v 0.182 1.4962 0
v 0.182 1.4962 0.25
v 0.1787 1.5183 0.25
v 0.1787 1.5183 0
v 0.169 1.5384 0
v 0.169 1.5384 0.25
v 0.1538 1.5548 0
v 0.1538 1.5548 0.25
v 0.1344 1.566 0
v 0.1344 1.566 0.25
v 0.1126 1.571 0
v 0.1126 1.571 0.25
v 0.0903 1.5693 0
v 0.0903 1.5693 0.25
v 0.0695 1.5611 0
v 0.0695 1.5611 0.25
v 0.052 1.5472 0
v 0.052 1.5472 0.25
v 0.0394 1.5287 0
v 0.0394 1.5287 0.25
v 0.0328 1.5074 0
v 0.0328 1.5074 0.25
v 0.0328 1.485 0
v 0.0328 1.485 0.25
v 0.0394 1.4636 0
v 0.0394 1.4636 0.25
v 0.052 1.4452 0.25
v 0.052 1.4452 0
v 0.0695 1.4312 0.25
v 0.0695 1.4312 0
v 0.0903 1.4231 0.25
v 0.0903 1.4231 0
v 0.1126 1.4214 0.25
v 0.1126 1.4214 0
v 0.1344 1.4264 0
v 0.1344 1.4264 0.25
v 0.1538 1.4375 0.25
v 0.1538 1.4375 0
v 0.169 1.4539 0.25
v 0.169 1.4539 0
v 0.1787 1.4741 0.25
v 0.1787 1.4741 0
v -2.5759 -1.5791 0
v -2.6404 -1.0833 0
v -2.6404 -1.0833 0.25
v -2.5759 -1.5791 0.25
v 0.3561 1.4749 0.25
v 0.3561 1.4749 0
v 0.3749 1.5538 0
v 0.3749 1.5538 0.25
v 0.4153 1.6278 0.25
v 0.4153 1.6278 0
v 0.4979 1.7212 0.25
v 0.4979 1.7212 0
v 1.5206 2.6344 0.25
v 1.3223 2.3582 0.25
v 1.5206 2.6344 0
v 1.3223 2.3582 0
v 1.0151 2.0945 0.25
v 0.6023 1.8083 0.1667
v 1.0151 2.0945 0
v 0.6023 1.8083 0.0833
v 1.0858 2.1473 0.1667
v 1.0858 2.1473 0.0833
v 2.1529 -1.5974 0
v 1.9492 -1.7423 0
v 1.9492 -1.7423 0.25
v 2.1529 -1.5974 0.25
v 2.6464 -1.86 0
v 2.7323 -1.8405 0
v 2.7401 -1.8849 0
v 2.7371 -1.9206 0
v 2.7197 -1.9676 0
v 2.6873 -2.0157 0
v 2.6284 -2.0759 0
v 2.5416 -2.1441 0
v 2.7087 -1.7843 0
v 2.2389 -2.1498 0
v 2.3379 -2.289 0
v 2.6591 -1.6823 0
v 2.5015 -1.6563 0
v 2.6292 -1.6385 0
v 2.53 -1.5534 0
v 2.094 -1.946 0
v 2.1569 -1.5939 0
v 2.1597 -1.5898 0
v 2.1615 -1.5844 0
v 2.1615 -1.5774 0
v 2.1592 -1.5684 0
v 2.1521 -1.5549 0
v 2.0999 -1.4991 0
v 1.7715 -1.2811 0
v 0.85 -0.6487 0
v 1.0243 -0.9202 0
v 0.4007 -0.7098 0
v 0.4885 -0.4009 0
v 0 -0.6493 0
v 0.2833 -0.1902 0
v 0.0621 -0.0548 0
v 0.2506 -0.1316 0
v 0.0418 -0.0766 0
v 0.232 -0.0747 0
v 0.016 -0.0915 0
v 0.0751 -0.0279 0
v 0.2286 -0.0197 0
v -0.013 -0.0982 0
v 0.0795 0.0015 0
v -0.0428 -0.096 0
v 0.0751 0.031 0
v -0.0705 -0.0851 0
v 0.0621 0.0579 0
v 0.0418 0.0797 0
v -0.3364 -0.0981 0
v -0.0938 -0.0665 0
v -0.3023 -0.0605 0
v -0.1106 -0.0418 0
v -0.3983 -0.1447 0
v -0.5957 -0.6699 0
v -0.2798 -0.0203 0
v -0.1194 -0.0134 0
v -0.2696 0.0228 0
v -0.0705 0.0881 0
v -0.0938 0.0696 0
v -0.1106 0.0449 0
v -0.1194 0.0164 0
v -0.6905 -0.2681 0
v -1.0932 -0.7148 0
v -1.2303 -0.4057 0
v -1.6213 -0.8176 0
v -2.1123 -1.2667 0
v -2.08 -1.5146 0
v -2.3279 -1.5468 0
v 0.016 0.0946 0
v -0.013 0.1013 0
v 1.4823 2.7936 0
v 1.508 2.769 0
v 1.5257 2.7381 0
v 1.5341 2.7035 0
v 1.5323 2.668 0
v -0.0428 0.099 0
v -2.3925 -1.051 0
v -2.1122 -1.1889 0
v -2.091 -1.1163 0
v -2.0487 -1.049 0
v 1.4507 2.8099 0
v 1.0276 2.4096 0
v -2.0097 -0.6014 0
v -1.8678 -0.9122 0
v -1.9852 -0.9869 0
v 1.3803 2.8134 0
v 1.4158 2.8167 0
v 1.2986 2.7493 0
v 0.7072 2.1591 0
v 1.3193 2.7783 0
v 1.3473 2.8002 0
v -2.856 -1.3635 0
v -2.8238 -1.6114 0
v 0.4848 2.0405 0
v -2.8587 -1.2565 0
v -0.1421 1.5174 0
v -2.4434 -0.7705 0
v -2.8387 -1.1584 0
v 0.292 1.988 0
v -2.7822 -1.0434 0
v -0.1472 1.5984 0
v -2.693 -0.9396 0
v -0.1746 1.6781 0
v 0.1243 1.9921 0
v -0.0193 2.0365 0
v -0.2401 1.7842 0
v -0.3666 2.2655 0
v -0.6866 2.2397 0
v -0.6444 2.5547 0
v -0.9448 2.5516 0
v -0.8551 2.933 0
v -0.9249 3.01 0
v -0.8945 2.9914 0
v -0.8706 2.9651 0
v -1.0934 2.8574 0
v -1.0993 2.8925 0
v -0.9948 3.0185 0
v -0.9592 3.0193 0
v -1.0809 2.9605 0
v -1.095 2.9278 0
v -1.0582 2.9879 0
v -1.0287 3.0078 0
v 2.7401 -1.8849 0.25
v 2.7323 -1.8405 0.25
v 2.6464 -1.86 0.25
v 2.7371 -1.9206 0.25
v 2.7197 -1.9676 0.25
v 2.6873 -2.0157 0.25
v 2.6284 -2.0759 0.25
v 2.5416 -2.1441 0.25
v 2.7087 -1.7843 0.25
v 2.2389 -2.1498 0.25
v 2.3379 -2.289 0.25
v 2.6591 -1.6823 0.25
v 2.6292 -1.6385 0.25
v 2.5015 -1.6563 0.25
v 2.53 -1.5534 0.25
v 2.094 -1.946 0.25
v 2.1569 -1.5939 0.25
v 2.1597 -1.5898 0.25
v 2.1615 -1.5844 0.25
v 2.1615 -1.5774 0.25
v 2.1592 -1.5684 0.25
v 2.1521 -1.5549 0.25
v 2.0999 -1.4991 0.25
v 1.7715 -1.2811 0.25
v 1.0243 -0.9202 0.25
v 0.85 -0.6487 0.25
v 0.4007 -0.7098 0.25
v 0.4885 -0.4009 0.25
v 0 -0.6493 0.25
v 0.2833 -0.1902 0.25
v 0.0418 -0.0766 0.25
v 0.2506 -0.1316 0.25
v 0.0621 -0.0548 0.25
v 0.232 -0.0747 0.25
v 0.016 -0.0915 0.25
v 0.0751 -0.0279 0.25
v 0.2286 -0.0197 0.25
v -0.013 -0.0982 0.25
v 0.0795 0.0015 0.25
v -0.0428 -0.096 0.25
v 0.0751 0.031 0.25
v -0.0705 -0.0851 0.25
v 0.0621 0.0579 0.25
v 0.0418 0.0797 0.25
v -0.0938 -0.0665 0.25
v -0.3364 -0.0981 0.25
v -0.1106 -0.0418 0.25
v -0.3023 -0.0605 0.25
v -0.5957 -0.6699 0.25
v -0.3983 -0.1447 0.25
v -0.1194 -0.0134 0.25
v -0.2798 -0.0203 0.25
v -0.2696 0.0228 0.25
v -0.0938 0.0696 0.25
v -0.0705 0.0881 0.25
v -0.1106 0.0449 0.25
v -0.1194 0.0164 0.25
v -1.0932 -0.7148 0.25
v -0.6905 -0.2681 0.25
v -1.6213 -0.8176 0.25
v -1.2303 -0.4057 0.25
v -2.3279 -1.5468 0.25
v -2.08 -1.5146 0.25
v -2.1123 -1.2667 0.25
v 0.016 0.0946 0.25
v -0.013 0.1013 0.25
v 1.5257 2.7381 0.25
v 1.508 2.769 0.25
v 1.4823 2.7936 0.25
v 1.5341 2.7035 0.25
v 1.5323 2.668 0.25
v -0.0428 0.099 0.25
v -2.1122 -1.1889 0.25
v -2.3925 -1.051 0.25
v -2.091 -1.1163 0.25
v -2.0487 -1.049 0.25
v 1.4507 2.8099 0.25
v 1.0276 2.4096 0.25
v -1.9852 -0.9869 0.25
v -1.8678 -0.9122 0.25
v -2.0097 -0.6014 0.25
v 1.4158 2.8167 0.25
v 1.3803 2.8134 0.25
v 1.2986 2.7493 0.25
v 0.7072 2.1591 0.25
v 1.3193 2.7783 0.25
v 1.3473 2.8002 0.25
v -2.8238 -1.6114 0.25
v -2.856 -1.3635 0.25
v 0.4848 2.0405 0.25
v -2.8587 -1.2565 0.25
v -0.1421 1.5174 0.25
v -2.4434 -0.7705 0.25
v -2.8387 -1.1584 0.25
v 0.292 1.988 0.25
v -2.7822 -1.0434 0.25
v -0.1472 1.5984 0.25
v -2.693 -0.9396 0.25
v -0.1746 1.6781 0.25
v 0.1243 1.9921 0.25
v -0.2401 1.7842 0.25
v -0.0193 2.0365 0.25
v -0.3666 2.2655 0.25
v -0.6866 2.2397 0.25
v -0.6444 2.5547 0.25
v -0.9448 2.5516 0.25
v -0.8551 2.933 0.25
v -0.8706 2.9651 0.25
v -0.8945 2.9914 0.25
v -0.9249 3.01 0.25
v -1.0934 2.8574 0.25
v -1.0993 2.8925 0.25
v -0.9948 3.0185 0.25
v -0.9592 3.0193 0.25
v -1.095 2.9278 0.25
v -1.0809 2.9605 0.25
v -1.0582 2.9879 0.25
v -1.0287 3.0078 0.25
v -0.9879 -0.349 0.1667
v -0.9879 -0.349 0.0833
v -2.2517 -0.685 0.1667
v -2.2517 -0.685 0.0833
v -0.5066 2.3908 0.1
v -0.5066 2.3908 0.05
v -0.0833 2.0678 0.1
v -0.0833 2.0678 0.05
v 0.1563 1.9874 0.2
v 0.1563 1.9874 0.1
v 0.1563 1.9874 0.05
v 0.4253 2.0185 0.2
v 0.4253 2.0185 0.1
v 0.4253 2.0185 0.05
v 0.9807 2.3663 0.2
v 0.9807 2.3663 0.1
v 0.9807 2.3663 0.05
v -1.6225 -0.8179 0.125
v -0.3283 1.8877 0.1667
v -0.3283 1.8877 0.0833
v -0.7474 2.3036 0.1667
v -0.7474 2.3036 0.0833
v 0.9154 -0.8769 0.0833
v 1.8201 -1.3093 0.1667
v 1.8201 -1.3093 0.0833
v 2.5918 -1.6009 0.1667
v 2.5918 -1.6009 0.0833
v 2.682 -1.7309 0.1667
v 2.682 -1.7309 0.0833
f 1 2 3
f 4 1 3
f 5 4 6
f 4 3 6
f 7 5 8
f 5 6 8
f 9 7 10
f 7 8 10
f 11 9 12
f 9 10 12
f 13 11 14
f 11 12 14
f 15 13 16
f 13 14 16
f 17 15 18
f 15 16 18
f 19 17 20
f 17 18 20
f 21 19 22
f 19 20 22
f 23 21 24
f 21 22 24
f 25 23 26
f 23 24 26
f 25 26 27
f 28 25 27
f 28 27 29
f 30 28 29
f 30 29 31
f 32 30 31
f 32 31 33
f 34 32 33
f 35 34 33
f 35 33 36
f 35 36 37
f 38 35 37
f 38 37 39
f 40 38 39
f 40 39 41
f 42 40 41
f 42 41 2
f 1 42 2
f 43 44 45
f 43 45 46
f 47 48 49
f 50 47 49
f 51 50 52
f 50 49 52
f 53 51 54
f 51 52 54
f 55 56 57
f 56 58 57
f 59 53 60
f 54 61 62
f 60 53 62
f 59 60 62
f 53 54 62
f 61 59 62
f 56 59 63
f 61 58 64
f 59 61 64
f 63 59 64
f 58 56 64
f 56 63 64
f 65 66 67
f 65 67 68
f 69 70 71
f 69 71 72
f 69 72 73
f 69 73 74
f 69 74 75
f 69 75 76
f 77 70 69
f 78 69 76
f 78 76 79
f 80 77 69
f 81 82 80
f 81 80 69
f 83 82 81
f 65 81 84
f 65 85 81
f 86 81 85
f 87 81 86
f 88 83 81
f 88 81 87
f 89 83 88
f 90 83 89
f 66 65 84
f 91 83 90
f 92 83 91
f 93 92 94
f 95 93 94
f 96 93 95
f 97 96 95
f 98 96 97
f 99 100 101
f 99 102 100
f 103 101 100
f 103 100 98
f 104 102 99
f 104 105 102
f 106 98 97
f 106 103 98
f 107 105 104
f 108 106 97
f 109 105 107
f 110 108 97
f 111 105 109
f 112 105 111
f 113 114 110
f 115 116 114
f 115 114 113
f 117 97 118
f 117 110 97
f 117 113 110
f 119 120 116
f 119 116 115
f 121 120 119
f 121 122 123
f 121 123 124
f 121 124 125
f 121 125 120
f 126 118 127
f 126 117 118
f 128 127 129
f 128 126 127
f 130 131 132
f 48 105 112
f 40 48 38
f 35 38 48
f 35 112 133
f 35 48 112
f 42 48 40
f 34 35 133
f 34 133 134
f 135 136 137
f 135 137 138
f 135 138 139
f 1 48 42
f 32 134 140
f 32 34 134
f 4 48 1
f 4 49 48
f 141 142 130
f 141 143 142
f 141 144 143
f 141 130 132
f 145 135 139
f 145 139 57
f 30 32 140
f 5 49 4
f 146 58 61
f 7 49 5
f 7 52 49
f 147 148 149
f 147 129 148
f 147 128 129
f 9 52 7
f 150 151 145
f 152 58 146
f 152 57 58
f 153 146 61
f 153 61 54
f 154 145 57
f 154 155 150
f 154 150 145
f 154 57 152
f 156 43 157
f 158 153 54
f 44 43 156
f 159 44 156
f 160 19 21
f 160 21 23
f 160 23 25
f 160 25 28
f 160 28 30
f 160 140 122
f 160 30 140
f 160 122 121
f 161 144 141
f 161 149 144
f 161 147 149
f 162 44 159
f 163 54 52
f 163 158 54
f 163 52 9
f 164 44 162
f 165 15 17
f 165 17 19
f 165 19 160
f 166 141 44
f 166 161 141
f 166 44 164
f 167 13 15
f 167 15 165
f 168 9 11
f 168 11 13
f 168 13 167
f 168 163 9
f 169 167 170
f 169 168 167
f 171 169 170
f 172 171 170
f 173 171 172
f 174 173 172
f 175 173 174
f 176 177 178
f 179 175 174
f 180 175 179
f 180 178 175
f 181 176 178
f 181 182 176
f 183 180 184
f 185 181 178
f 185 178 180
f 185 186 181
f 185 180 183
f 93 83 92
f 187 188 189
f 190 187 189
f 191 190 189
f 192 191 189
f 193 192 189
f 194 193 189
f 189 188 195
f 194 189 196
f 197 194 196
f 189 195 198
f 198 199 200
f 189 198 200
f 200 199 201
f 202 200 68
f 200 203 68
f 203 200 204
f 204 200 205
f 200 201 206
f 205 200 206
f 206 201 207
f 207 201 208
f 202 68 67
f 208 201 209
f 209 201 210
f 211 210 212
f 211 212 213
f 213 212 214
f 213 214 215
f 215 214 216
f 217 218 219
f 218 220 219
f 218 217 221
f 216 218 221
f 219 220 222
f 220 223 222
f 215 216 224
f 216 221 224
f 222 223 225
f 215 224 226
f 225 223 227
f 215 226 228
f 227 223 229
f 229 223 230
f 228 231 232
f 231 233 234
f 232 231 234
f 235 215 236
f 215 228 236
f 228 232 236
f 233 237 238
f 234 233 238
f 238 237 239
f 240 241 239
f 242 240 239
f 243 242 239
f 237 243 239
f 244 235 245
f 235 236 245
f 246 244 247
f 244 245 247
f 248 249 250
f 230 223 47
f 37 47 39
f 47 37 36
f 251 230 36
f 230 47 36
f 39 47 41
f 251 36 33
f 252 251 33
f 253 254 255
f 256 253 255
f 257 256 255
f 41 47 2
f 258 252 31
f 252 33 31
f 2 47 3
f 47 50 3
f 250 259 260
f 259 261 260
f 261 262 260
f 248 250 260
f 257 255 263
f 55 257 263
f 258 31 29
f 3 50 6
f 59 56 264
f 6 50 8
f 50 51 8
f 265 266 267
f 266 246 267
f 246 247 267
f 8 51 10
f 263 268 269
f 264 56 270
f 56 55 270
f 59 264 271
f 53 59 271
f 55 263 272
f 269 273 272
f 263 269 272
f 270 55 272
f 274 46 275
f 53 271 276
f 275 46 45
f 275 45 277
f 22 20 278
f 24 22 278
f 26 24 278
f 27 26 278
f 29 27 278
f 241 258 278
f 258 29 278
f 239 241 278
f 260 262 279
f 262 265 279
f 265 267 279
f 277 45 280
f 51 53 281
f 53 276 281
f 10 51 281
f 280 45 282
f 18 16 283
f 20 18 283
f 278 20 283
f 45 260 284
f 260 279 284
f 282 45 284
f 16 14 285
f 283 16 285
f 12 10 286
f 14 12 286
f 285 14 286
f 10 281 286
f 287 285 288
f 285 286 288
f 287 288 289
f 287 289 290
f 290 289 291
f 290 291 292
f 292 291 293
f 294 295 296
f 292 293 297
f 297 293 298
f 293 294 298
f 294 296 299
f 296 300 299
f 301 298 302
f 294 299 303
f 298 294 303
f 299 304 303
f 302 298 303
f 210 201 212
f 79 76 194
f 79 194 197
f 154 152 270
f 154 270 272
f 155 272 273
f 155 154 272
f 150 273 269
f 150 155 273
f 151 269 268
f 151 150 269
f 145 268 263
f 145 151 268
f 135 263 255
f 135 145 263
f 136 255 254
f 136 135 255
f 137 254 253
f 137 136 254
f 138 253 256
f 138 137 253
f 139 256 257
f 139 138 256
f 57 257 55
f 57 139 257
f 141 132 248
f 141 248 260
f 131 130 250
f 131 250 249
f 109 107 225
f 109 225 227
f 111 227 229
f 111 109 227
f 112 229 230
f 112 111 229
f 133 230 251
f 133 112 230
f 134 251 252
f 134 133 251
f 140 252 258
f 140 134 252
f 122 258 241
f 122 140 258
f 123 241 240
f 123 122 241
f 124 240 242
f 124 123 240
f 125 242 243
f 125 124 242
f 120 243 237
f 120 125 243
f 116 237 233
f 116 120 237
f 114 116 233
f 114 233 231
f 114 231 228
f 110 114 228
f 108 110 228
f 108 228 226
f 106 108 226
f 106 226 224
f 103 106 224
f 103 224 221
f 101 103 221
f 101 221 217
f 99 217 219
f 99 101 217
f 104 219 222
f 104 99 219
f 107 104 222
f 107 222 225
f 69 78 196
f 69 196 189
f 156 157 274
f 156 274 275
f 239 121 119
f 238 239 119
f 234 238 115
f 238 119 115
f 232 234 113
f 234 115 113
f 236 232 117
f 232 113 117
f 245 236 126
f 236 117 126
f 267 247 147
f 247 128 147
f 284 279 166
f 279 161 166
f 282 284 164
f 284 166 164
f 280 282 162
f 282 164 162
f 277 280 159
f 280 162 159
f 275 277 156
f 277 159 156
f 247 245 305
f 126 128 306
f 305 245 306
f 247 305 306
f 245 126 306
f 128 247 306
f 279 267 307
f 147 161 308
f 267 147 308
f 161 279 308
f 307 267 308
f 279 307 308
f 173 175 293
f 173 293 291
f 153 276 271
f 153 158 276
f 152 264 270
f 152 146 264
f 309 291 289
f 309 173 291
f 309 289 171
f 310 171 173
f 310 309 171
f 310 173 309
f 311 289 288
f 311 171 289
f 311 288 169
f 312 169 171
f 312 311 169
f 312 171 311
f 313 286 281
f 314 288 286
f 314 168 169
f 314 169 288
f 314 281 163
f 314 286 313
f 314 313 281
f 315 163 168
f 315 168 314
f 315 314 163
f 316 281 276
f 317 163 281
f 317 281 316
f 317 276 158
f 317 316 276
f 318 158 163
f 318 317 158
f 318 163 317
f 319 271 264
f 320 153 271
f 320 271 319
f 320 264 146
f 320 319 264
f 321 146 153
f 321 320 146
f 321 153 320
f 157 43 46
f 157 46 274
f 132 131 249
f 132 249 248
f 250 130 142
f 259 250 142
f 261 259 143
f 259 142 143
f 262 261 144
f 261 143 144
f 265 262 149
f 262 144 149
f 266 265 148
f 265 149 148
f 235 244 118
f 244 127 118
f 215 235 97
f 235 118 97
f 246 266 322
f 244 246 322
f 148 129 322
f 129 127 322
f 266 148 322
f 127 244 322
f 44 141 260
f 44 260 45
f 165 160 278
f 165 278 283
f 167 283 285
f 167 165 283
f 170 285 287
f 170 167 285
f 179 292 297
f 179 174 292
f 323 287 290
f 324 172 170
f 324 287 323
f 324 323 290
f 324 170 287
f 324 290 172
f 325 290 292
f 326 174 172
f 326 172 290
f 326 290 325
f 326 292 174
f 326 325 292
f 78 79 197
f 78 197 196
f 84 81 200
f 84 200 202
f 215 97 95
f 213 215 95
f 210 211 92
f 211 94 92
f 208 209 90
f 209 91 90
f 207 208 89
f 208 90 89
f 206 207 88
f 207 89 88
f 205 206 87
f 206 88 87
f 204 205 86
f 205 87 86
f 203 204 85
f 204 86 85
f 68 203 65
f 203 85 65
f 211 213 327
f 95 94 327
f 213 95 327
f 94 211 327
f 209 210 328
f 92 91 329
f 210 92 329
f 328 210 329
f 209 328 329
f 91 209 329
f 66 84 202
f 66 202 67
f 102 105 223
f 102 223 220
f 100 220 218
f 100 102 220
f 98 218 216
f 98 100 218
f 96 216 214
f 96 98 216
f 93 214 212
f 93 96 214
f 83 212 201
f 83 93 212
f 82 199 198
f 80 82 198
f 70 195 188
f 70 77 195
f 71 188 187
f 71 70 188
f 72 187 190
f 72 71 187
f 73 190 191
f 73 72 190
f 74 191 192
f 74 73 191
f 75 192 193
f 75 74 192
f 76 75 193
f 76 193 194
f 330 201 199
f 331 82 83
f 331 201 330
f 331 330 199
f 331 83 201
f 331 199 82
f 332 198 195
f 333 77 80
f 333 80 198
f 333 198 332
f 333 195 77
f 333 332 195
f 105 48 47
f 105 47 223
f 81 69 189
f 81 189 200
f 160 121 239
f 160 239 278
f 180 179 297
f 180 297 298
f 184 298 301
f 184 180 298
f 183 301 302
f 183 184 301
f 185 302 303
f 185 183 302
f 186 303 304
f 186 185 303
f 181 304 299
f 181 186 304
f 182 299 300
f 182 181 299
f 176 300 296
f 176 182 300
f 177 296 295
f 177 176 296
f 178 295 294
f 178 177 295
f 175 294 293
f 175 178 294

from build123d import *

# Parameters (mm, degrees)
CROQUIS2_R              = 0.1
SALIENTE_EXTRUIR1_DEPTH = 0.25
CORTAR_EXTRUIR1_REACH   = 2.25
CROQUIS3_R              = 0.075


with BuildPart() as part:
    # Croquis2 → Saliente-Extruir1 (new body)
    with BuildSketch(Plane.XY):
        with BuildLine():
            Line((-0.269598267, 0.022789063), (-0.142105821, 1.517361134))
            add(Edge.make_bspline(
                [(-0.142105821, 1.517361134), (-0.109838872, 1.89562104), (-0.885940975, 2.203998579), (-1.093422206, 2.857380392)],
                knots=[0, 0, 0, 0, 1, 1, 1, 1], degree=3))
            ThreePointArc((-1.093422206, 2.857380392), (-1.012116817, 3.014349923), (-0.855147286, 2.933044534))
            add(Edge.make_bspline(
                [(-0.855147286, 2.933044534), (-0.802855117, 2.791522862), (-0.626812715, 2.478271421), (-0.035560561, 1.991764327), (0.301694252, 1.837503211), (1.044165071, 2.405999525), (1.189353221, 2.580037978), (1.298605199, 2.749321595)],
                knots=[0, 0, 0, 0, 0.244258263, 0.330799973, 0.806015197, 0.87887539, 1, 1, 1, 1], degree=3))
            ThreePointArc((1.298605199, 2.749321595), (1.467077873, 2.802865578), (1.520621856, 2.634392904))
            add(Edge.make_bspline(
                [(0.35608487, 1.474863652), (0.388351819, 1.853123558), (1.20547196, 2.025593431), (1.520621856, 2.634392904)],
                knots=[0, 0, 0, 0, 1, 1, 1, 1], degree=3))
            Line((0.35608487, 1.474863652), (0.228592423, -0.01970842))
            add(Edge.make_bspline(
                [(0.228592423, -0.01970842), (0.186017725, -0.518804304), (2.575198102, -1.415220642), (2.703175685, -1.813334927), (2.829784292, -1.939232669), (2.541637207, -2.144125176)],
                knots=[0, 0, 0, 0, 0.598179598, 0.698179598, 1, 1, 1, 1], degree=3))
            Line((2.541637207, -2.144125176), (2.33789434, -2.289000447))
            Line((2.33789434, -2.289000447), (2.238900912, -2.149782727))
            Line((2.238900912, -2.149782727), (2.646386646, -1.860032185))
            Line((2.646386646, -1.860032185), (2.501511376, -1.656289318))
            Line((2.501511376, -1.656289318), (2.094025641, -1.946039859))
            Line((2.094025641, -1.946039859), (1.94915037, -1.742296992))
            Line((1.94915037, -1.742296992), (2.152893238, -1.597421721))
            add(Edge.make_bspline(
                [(0, -0.6492922), (0.733736911, -0.658123462), (2.29312136, -1.497709828), (2.152893238, -1.597421721)],
                knots=[0, 0, 0, 0, 1, 1, 1, 1], degree=3))
            add(Edge.make_bspline(
                [(-2.112304641, -1.266657747), (-2.188936025, -0.677872613), (0, -0.6492922)],
                knots=[0, 0, 0, 1, 1, 1], degree=2))
            Line((-2.112304641, -1.266657747), (-2.080038852, -1.514566841))
            Line((-2.080038852, -1.514566841), (-2.327947946, -1.54683263))
            Line((-2.327947946, -1.54683263), (-2.392479524, -1.051014442))
            Line((-2.392479524, -1.051014442), (-2.640388618, -1.083280231))
            Line((-2.640388618, -1.083280231), (-2.57585704, -1.579098419))
            Line((-2.57585704, -1.579098419), (-2.823766134, -1.611364208))
            Line((-2.823766134, -1.611364208), (-2.856031923, -1.363455114))
            add(Edge.make_bspline(
                [(-0.269598267, 0.022789063), (-0.313593623, -0.492960939), (-2.983037055, -0.387631246), (-2.856031923, -1.363455114)],
                knots=[0, 0, 0, 0, 1, 1, 1, 1], degree=3))
        make_face()
        with Locations((-0.020502922, 0.001540322)):
            Circle(CROQUIS2_R, mode=Mode.SUBTRACT)
    extrude(amount=SALIENTE_EXTRUIR1_DEPTH)

    # Croquis3 → Cortar-Extruir1 (cut, up to next)
    with BuildSketch(Plane.XY.offset(0.25), mode=Mode.PRIVATE) as cortar_extruir1_sk1:
        with Locations((0.106995218, 1.496179141)):
            Circle(CROQUIS3_R)
    cortar_extruir1_tool1 = extrude(cortar_extruir1_sk1.sketch, amount=-CORTAR_EXTRUIR1_REACH, mode=Mode.PRIVATE) & part.part
    add(cortar_extruir1_tool1.solids().sort_by_distance((0.106995, 1.496179, 0.25))[0], mode=Mode.SUBTRACT)


solid = part.part
